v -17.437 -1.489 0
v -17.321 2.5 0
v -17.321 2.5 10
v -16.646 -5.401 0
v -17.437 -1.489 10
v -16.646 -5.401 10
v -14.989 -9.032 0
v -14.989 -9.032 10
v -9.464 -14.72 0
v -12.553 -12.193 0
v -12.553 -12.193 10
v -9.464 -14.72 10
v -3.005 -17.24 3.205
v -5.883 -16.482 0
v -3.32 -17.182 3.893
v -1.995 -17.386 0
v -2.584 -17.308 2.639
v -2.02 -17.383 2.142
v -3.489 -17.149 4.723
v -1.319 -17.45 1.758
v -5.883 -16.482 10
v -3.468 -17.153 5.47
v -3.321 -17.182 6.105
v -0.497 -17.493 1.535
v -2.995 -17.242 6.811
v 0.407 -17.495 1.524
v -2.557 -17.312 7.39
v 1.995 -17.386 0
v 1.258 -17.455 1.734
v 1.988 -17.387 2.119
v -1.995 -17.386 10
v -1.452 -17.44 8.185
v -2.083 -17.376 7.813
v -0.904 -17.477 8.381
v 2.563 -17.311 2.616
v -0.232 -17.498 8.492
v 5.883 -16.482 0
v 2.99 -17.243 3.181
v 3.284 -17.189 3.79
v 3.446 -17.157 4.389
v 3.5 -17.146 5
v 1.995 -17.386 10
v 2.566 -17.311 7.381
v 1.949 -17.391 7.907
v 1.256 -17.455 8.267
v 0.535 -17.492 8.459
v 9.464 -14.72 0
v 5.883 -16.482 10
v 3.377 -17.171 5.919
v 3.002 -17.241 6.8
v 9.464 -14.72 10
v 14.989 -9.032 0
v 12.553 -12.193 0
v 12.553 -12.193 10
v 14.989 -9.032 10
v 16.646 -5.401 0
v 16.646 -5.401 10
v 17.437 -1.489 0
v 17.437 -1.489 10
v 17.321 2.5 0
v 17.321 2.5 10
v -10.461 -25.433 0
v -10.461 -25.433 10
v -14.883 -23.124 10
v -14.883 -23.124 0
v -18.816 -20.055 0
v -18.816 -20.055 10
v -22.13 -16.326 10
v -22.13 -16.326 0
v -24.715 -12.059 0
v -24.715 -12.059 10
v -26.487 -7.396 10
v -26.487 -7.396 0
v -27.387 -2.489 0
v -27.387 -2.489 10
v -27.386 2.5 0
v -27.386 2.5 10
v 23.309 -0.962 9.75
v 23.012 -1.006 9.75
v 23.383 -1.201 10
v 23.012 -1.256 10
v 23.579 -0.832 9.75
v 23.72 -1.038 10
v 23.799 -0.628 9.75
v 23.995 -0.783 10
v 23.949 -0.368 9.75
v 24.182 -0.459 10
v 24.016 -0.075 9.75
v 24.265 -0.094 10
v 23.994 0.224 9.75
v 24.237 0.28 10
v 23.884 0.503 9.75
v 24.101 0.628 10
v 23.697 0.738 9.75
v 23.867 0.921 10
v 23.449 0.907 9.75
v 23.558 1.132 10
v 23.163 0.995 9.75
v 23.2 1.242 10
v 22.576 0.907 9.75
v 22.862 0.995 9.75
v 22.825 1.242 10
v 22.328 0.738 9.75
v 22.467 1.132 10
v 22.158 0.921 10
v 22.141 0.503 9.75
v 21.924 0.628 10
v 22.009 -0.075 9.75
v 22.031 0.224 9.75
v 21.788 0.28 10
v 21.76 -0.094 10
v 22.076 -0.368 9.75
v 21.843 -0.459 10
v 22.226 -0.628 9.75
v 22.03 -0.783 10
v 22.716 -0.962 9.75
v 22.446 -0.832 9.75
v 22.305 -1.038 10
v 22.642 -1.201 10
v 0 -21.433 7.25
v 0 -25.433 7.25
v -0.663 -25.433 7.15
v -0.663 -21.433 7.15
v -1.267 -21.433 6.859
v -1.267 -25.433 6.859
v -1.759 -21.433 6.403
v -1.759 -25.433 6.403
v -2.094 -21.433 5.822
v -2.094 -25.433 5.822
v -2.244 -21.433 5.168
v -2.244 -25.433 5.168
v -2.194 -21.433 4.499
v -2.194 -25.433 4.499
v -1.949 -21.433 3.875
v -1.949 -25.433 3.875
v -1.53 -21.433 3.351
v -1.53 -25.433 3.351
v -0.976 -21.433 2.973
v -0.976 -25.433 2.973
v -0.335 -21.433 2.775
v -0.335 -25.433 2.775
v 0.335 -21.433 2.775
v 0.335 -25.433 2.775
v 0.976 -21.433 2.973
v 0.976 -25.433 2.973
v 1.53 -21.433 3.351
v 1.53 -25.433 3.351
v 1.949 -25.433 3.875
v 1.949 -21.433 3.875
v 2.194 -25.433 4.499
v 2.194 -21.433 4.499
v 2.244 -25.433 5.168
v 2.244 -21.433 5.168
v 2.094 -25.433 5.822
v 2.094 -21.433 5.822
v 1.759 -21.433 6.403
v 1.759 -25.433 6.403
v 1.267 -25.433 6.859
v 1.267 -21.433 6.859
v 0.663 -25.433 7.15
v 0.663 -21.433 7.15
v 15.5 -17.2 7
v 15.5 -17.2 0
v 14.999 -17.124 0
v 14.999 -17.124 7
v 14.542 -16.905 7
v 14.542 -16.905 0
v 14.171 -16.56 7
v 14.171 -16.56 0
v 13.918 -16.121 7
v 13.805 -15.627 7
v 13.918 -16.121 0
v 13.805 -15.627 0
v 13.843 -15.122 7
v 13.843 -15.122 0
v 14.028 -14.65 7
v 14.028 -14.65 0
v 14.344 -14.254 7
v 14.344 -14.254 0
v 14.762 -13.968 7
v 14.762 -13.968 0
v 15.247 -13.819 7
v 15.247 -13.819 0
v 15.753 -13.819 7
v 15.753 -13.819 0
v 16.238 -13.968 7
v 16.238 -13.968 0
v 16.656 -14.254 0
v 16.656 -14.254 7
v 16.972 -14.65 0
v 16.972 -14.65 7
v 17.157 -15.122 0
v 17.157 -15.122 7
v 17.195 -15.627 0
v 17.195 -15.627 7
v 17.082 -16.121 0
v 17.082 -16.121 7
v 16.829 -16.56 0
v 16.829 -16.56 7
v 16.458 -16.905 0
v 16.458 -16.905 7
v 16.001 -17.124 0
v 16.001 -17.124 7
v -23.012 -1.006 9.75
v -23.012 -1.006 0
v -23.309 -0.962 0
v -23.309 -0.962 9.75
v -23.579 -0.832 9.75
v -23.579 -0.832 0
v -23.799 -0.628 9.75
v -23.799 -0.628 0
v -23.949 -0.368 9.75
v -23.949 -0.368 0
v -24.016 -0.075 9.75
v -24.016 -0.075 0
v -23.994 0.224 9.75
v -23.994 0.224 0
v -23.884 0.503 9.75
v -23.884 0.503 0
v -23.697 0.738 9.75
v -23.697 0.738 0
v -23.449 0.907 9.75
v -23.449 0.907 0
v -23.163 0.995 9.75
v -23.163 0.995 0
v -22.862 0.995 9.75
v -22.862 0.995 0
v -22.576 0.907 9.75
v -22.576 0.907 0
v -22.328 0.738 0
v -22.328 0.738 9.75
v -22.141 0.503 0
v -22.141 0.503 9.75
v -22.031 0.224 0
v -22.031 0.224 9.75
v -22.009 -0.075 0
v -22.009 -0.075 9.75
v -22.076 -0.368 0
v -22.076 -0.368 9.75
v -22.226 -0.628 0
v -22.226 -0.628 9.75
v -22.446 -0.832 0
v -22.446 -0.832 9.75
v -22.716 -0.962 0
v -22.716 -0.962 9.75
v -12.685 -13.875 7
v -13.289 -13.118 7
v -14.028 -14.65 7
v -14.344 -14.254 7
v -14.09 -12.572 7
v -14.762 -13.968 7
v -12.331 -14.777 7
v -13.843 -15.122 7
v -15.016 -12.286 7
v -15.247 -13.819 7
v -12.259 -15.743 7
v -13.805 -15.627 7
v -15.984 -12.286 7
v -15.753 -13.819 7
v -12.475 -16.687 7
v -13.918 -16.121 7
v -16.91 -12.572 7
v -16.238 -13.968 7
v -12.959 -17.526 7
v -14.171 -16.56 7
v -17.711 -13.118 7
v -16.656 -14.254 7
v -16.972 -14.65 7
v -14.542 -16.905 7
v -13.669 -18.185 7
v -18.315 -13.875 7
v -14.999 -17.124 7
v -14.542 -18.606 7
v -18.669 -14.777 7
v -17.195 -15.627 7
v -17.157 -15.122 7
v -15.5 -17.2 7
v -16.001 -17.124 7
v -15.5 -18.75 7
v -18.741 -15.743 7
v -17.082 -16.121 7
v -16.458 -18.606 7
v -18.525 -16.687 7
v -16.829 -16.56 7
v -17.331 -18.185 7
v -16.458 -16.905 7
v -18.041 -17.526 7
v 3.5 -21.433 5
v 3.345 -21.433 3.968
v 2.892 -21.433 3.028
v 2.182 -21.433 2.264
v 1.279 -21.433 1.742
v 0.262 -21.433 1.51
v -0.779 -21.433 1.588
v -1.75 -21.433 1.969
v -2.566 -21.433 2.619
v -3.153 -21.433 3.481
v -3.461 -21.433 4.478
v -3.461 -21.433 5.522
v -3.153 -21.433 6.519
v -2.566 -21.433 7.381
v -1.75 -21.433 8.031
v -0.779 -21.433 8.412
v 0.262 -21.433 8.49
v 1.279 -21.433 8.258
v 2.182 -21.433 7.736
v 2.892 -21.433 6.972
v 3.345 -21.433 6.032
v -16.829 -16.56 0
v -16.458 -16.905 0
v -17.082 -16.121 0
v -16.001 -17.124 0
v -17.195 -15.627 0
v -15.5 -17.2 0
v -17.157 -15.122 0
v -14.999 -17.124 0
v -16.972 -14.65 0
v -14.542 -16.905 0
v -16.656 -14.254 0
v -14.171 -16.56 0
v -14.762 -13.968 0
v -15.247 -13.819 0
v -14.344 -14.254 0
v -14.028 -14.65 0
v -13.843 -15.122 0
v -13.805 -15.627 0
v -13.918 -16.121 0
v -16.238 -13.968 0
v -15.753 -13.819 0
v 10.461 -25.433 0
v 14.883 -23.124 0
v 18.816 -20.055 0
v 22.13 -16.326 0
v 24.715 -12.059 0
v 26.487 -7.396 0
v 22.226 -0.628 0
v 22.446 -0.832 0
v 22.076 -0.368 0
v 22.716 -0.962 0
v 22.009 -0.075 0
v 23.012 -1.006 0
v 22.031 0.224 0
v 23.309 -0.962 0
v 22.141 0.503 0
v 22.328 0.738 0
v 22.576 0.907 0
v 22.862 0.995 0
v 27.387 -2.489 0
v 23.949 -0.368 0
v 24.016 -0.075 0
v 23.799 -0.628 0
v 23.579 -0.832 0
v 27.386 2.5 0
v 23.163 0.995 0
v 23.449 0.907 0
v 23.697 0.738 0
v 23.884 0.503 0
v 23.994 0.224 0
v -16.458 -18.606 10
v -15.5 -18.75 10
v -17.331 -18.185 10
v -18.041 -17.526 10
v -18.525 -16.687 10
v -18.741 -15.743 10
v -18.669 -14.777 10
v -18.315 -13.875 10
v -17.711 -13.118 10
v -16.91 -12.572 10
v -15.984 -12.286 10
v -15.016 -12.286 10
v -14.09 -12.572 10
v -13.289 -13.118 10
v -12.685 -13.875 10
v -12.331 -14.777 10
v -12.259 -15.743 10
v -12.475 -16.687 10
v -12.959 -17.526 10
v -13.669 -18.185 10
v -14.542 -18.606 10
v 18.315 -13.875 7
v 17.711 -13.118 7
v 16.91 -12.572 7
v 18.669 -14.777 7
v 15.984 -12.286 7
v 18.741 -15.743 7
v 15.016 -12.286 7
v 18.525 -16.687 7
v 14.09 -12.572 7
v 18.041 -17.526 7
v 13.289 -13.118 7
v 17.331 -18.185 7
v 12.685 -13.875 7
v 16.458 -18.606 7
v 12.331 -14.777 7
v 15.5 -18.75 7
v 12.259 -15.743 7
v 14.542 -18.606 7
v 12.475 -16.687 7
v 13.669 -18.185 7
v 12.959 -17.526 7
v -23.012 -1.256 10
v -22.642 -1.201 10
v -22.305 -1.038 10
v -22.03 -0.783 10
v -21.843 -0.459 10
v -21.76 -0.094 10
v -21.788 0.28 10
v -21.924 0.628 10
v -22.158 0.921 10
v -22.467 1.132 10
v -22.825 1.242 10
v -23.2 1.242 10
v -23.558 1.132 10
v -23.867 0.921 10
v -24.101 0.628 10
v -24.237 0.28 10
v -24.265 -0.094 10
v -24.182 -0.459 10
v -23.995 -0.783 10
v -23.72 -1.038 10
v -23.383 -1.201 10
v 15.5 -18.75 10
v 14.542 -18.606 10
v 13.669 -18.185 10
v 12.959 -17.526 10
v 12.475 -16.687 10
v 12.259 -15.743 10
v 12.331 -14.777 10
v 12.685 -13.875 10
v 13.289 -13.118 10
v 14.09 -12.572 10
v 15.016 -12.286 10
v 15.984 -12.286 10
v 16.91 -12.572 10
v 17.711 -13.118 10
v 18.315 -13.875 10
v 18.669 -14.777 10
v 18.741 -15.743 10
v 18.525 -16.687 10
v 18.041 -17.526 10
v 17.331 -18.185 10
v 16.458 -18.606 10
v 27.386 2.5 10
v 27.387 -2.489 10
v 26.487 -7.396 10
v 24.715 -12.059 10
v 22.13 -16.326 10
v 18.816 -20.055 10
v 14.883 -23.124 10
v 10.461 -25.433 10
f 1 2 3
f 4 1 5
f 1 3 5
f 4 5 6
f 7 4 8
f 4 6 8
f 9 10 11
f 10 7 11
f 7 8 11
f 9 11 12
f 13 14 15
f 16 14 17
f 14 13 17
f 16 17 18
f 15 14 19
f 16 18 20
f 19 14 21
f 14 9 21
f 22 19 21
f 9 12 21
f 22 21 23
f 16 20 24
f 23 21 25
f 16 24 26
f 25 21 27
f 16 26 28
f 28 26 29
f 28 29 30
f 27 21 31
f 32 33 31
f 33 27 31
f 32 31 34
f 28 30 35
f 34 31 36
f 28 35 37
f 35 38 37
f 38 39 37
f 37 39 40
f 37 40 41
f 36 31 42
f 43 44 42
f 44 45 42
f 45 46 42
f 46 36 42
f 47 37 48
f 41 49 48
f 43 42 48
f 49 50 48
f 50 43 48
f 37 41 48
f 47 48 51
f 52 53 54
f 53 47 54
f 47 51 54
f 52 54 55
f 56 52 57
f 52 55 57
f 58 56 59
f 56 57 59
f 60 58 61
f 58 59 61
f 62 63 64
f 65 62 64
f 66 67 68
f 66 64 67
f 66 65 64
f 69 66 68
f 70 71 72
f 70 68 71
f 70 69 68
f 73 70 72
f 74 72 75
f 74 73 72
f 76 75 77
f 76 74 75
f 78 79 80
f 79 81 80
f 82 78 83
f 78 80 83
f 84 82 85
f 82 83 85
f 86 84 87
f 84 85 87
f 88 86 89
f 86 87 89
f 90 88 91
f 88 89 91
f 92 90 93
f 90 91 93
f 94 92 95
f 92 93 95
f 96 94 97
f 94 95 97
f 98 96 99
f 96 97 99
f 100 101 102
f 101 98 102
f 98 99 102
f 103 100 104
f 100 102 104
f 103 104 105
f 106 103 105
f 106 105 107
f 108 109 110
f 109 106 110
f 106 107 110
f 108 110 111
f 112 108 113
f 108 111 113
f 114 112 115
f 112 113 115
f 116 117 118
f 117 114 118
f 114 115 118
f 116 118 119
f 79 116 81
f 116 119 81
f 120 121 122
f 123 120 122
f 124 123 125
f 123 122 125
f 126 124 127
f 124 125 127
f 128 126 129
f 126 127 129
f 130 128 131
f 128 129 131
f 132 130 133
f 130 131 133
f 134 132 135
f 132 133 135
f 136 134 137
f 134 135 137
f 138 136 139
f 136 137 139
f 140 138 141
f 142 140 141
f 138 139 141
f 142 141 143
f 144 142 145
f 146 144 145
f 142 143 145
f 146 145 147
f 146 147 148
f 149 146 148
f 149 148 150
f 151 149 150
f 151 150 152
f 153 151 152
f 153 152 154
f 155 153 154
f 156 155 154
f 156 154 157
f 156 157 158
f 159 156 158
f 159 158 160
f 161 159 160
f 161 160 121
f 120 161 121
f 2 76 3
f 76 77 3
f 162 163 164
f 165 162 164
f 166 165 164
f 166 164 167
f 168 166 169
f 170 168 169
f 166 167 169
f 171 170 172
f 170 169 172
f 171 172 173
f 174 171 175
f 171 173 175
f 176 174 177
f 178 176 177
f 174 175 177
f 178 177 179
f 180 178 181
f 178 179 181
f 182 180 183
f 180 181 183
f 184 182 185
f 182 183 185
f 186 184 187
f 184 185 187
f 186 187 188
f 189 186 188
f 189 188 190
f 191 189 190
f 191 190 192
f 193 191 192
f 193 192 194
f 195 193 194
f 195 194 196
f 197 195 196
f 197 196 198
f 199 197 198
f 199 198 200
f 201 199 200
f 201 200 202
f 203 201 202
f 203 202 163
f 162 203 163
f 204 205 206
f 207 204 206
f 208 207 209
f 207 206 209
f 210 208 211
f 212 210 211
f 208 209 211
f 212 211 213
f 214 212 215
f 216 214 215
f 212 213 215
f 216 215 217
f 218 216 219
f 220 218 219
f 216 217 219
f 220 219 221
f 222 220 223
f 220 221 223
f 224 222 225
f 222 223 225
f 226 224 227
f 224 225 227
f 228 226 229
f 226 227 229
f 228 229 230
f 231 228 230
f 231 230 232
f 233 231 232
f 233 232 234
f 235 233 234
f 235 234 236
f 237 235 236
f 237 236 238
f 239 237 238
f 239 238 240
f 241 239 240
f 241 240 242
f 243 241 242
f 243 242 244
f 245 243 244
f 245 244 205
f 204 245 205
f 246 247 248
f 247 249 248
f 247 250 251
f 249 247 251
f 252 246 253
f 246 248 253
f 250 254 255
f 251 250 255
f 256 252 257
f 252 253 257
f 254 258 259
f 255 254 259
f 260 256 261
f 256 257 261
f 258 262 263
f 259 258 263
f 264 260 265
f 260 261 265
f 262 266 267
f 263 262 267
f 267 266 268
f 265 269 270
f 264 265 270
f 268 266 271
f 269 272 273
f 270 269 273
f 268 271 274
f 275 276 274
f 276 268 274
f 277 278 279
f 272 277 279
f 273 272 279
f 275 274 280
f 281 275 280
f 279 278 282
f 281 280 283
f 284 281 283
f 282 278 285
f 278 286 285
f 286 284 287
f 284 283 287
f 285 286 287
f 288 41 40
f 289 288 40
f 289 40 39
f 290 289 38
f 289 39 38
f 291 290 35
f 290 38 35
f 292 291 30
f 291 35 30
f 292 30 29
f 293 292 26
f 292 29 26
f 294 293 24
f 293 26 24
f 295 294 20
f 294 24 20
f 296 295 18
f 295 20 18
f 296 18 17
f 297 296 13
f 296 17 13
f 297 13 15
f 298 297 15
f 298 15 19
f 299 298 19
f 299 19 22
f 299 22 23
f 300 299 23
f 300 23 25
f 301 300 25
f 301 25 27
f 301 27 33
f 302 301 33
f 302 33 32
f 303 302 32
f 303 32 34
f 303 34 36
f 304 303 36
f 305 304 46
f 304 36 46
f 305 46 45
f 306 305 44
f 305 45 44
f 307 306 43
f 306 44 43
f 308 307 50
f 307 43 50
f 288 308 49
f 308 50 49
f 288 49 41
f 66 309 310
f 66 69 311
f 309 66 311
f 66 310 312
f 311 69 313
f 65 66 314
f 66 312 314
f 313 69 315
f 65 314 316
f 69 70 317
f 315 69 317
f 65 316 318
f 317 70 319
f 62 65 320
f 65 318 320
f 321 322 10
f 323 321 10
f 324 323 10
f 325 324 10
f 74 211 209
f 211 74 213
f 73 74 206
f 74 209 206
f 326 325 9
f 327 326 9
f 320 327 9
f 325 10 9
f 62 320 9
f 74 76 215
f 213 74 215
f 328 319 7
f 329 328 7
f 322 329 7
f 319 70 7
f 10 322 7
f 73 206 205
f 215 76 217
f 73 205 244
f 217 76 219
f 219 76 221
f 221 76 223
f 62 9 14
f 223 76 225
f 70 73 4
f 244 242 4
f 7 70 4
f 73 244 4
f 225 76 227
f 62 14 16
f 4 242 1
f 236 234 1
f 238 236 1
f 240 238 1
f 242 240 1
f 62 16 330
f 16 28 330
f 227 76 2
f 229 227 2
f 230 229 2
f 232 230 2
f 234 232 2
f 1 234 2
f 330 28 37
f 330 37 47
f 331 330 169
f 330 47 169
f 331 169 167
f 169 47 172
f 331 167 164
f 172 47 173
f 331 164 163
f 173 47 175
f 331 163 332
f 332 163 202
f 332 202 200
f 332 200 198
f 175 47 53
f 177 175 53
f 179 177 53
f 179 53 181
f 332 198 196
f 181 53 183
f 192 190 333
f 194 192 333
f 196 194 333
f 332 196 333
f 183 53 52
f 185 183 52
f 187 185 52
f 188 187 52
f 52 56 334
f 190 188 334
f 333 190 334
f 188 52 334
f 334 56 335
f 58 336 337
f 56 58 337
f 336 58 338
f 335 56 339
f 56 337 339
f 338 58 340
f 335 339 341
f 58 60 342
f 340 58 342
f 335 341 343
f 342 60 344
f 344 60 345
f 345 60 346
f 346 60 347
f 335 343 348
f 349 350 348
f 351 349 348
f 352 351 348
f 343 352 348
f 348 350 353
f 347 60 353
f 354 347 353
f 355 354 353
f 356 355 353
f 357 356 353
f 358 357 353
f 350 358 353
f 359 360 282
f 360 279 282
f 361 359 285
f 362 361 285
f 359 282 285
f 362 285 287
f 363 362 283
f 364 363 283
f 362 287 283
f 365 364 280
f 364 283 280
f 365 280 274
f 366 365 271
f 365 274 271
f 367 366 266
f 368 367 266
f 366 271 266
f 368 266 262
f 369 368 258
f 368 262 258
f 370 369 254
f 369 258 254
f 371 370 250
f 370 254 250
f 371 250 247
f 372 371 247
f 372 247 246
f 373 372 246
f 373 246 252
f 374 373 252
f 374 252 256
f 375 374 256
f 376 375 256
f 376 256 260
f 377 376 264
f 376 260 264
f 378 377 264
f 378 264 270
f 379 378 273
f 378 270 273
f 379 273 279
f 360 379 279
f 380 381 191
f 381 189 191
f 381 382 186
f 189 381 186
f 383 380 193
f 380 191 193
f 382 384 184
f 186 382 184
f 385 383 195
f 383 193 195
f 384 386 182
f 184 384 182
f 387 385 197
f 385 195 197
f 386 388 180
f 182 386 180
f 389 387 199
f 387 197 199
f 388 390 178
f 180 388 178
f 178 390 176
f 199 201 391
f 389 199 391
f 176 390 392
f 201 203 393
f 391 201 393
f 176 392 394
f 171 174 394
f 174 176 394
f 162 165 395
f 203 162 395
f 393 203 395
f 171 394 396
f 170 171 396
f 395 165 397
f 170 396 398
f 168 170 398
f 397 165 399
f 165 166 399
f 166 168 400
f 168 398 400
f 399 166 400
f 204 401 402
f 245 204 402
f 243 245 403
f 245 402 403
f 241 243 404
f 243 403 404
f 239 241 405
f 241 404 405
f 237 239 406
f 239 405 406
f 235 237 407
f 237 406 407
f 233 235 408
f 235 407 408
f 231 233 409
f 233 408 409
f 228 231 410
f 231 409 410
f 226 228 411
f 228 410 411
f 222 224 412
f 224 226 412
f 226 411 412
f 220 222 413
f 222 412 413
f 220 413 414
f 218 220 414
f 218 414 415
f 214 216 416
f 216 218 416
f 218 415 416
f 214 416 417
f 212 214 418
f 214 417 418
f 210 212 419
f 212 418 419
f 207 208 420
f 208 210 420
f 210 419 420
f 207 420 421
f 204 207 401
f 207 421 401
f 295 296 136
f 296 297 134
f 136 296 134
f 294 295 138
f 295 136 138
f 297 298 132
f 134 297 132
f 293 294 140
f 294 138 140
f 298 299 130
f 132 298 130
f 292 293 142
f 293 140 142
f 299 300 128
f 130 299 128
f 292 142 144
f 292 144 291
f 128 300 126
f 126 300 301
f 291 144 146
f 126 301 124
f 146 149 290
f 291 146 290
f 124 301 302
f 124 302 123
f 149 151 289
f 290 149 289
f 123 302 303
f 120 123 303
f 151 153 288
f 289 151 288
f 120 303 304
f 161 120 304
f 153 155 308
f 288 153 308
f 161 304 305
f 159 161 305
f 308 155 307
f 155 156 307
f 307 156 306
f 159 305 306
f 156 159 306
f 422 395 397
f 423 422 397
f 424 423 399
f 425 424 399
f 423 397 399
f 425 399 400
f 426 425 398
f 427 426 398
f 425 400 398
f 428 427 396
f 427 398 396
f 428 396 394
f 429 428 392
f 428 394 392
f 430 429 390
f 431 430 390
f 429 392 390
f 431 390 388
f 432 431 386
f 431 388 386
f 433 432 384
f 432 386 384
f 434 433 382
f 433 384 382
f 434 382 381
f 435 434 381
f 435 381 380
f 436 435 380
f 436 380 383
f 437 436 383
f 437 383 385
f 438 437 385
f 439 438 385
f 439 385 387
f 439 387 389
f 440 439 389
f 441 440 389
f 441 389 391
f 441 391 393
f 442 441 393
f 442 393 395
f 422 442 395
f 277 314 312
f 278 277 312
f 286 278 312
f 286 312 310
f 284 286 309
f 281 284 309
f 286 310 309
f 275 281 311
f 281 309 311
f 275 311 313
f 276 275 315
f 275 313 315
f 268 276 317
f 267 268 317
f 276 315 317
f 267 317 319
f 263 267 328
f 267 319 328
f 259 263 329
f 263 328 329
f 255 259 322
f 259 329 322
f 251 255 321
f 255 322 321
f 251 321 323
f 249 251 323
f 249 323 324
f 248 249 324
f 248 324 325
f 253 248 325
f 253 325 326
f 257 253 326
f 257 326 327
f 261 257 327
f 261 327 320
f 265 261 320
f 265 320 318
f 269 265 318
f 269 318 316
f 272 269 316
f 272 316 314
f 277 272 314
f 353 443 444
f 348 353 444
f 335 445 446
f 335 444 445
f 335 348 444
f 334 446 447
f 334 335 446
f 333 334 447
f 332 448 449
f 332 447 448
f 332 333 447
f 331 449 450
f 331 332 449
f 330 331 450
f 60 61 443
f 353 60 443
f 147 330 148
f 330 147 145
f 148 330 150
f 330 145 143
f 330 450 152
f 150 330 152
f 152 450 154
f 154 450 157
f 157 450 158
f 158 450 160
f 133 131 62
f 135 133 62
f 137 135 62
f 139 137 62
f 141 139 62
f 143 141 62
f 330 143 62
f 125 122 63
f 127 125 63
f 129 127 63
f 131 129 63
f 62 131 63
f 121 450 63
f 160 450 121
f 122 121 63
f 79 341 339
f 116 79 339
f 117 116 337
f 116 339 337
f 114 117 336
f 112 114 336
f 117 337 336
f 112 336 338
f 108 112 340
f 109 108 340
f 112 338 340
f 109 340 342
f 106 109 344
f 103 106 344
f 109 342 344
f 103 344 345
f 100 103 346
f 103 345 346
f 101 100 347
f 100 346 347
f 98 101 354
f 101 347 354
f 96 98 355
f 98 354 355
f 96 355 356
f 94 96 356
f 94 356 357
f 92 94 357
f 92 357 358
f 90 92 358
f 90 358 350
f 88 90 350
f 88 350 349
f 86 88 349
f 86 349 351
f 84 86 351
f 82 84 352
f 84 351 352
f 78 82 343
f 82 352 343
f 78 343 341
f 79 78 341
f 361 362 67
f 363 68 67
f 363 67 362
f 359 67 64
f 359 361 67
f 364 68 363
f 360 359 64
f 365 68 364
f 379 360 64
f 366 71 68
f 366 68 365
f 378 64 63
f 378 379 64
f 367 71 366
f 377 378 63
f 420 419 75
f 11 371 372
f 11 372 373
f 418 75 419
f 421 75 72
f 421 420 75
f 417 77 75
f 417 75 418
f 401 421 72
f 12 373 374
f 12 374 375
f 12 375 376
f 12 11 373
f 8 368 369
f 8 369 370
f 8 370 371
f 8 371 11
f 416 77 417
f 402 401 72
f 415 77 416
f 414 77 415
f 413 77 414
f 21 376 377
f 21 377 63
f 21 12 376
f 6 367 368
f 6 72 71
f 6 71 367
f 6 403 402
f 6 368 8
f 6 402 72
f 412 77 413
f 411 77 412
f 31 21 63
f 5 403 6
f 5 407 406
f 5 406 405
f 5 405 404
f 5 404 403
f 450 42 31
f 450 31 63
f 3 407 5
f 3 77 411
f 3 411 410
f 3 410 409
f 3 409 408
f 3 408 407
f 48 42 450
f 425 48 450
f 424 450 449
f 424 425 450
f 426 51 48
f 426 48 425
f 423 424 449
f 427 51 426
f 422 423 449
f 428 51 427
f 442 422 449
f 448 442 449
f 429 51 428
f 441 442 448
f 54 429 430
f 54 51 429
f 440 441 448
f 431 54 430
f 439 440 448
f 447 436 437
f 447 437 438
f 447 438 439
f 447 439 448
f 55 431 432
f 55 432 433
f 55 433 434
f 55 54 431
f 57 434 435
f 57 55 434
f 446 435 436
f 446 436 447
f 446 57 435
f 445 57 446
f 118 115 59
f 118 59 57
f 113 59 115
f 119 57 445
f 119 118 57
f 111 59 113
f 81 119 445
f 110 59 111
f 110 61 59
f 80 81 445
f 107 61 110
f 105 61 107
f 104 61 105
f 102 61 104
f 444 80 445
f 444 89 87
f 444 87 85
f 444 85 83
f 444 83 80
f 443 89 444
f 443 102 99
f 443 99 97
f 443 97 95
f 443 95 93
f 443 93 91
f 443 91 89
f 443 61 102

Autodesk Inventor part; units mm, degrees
ref_plane "YZ Plane" through (0, 0, 0) normal (1, 0, 0) x (0, 1, 0)
ref_plane "XZ Plane" through (0, 0, 0) normal (0, 1, 0) x (-1, 0, 0)
sketch "Sketch2" plane through (0, 0, 0) normal (0, 0, 1) x (1, 0, 0)
  circle A0 centre (0, 0) radius 27.5
  dimension "d44" = 55
extrude "Extrusion1" add sketch "Sketch2" along normal blind 10
sketch "Sketch4" plane through (0, 0, 10) normal (0, 0, 1) x (1, 0, 0)
  point P0 (0, 0)
  point P1 (-15.5, -15.5)
  point P2 (15.5, -15.5)
hole "Hole1" at (-15.5, -15.5, 10) at (15.5, -15.5, 10) direction (0, 0, -1) diameter 3.4 end through all counterbore diameter 6.5 counterbore depth 3 clearance for "Socket Head Cap Screw" size "M3" standard "Ansi Metric M Profile"
sketch "Sketch7" plane through (0, 0, 10) normal (0, 0, 1) x (1, 0, 0)
  circle A0 centre (0, 0) radius 17.5
  dimension "d26" = 35
extrude "Extrusion4" cut sketch "Sketch7" against normal through all
sketch "Sketch8" plane through (0, 0, 10) normal (0, 0, 1) x (1, 0, 0)
  point P0 (-23.0125, 0)
  point P1 (23.0125, 0)
hole "Hole3" at (-23.0125, 0, 10) at (23.0125, 0, 10) direction (0, 0, -1) diameter 2.013 end through all thread size "M2.5x0.45" class "6H" standard "ANSI Metric M Profile"
chamfer "Chamfer1" distance 0.25 angle 45 1 edges at (-23.0125, 1.0065, 10)
chamfer "Chamfer2" distance 0.25 angle 45 1 edges at (23.0125, 1.0065, 10)
sketch "Sketch10" plane through (0, 0, 10) normal (0, 0, 1) x (1, 0, 0)
  line L0 (-15.5, -29.5673) -> (15.5, -29.5673)
  line L1 (15.5, -29.5673) -> (15.5, -25.4327)
  line L2 (15.5, -25.4327) -> (-15.5, -25.4327)
  line L3 (-15.5, -25.4327) -> (-15.5, -29.5673)
  line L4 (-15.5, -29.5673) -> (15.5, -25.4327) construction
  line L5 (15.5, -29.5673) -> (-15.5, -25.4327) construction
  line L6 (-30, 2.5) -> (30, 2.5)
  line L7 (30, 2.5) -> (30, 32.5)
  line L8 (30, 32.5) -> (-30, 32.5)
  line L9 (-30, 32.5) -> (-30, 2.5)
  point P0 (0, -27.5)
  dimension "d63" = 60
  dimension "d64" = 30
extrude "Extrusion6" cut sketch "Sketch10" against normal through all
ref_plane "Work Plane1" through (-10.4608, -15.4327, 10) normal (0, -1, 0) x (1, 0, 0)
sketch "Sketch13" plane through (-10.4608, -15.4327, 10) normal (0, -1, 0) x (1, 0, 0)
  point P0 (10.4608, -10)
  point P1 (10.4608, -5)
hole "Hole5" at (0, -15.4327, 5) direction (0, -1, 0) diameter 4.5 end through all clearance for "Hex Head Machine Screw" size "M4" standard "Ansi Metric M Profile"
sketch "Sketch14" plane through (-10.4608, -15.4327, 10) normal (0, -1, 0) x (1, 0, 0)
  circle A0 centre (10.4608, -5) radius 3.5
  point P0 (10.4608, -10)
  dimension "d73" = 7
extrude "Extrusion7" cut sketch "Sketch14" along normal blind 6
properties part number "Mount" material "Bronze, Soft Tin"
